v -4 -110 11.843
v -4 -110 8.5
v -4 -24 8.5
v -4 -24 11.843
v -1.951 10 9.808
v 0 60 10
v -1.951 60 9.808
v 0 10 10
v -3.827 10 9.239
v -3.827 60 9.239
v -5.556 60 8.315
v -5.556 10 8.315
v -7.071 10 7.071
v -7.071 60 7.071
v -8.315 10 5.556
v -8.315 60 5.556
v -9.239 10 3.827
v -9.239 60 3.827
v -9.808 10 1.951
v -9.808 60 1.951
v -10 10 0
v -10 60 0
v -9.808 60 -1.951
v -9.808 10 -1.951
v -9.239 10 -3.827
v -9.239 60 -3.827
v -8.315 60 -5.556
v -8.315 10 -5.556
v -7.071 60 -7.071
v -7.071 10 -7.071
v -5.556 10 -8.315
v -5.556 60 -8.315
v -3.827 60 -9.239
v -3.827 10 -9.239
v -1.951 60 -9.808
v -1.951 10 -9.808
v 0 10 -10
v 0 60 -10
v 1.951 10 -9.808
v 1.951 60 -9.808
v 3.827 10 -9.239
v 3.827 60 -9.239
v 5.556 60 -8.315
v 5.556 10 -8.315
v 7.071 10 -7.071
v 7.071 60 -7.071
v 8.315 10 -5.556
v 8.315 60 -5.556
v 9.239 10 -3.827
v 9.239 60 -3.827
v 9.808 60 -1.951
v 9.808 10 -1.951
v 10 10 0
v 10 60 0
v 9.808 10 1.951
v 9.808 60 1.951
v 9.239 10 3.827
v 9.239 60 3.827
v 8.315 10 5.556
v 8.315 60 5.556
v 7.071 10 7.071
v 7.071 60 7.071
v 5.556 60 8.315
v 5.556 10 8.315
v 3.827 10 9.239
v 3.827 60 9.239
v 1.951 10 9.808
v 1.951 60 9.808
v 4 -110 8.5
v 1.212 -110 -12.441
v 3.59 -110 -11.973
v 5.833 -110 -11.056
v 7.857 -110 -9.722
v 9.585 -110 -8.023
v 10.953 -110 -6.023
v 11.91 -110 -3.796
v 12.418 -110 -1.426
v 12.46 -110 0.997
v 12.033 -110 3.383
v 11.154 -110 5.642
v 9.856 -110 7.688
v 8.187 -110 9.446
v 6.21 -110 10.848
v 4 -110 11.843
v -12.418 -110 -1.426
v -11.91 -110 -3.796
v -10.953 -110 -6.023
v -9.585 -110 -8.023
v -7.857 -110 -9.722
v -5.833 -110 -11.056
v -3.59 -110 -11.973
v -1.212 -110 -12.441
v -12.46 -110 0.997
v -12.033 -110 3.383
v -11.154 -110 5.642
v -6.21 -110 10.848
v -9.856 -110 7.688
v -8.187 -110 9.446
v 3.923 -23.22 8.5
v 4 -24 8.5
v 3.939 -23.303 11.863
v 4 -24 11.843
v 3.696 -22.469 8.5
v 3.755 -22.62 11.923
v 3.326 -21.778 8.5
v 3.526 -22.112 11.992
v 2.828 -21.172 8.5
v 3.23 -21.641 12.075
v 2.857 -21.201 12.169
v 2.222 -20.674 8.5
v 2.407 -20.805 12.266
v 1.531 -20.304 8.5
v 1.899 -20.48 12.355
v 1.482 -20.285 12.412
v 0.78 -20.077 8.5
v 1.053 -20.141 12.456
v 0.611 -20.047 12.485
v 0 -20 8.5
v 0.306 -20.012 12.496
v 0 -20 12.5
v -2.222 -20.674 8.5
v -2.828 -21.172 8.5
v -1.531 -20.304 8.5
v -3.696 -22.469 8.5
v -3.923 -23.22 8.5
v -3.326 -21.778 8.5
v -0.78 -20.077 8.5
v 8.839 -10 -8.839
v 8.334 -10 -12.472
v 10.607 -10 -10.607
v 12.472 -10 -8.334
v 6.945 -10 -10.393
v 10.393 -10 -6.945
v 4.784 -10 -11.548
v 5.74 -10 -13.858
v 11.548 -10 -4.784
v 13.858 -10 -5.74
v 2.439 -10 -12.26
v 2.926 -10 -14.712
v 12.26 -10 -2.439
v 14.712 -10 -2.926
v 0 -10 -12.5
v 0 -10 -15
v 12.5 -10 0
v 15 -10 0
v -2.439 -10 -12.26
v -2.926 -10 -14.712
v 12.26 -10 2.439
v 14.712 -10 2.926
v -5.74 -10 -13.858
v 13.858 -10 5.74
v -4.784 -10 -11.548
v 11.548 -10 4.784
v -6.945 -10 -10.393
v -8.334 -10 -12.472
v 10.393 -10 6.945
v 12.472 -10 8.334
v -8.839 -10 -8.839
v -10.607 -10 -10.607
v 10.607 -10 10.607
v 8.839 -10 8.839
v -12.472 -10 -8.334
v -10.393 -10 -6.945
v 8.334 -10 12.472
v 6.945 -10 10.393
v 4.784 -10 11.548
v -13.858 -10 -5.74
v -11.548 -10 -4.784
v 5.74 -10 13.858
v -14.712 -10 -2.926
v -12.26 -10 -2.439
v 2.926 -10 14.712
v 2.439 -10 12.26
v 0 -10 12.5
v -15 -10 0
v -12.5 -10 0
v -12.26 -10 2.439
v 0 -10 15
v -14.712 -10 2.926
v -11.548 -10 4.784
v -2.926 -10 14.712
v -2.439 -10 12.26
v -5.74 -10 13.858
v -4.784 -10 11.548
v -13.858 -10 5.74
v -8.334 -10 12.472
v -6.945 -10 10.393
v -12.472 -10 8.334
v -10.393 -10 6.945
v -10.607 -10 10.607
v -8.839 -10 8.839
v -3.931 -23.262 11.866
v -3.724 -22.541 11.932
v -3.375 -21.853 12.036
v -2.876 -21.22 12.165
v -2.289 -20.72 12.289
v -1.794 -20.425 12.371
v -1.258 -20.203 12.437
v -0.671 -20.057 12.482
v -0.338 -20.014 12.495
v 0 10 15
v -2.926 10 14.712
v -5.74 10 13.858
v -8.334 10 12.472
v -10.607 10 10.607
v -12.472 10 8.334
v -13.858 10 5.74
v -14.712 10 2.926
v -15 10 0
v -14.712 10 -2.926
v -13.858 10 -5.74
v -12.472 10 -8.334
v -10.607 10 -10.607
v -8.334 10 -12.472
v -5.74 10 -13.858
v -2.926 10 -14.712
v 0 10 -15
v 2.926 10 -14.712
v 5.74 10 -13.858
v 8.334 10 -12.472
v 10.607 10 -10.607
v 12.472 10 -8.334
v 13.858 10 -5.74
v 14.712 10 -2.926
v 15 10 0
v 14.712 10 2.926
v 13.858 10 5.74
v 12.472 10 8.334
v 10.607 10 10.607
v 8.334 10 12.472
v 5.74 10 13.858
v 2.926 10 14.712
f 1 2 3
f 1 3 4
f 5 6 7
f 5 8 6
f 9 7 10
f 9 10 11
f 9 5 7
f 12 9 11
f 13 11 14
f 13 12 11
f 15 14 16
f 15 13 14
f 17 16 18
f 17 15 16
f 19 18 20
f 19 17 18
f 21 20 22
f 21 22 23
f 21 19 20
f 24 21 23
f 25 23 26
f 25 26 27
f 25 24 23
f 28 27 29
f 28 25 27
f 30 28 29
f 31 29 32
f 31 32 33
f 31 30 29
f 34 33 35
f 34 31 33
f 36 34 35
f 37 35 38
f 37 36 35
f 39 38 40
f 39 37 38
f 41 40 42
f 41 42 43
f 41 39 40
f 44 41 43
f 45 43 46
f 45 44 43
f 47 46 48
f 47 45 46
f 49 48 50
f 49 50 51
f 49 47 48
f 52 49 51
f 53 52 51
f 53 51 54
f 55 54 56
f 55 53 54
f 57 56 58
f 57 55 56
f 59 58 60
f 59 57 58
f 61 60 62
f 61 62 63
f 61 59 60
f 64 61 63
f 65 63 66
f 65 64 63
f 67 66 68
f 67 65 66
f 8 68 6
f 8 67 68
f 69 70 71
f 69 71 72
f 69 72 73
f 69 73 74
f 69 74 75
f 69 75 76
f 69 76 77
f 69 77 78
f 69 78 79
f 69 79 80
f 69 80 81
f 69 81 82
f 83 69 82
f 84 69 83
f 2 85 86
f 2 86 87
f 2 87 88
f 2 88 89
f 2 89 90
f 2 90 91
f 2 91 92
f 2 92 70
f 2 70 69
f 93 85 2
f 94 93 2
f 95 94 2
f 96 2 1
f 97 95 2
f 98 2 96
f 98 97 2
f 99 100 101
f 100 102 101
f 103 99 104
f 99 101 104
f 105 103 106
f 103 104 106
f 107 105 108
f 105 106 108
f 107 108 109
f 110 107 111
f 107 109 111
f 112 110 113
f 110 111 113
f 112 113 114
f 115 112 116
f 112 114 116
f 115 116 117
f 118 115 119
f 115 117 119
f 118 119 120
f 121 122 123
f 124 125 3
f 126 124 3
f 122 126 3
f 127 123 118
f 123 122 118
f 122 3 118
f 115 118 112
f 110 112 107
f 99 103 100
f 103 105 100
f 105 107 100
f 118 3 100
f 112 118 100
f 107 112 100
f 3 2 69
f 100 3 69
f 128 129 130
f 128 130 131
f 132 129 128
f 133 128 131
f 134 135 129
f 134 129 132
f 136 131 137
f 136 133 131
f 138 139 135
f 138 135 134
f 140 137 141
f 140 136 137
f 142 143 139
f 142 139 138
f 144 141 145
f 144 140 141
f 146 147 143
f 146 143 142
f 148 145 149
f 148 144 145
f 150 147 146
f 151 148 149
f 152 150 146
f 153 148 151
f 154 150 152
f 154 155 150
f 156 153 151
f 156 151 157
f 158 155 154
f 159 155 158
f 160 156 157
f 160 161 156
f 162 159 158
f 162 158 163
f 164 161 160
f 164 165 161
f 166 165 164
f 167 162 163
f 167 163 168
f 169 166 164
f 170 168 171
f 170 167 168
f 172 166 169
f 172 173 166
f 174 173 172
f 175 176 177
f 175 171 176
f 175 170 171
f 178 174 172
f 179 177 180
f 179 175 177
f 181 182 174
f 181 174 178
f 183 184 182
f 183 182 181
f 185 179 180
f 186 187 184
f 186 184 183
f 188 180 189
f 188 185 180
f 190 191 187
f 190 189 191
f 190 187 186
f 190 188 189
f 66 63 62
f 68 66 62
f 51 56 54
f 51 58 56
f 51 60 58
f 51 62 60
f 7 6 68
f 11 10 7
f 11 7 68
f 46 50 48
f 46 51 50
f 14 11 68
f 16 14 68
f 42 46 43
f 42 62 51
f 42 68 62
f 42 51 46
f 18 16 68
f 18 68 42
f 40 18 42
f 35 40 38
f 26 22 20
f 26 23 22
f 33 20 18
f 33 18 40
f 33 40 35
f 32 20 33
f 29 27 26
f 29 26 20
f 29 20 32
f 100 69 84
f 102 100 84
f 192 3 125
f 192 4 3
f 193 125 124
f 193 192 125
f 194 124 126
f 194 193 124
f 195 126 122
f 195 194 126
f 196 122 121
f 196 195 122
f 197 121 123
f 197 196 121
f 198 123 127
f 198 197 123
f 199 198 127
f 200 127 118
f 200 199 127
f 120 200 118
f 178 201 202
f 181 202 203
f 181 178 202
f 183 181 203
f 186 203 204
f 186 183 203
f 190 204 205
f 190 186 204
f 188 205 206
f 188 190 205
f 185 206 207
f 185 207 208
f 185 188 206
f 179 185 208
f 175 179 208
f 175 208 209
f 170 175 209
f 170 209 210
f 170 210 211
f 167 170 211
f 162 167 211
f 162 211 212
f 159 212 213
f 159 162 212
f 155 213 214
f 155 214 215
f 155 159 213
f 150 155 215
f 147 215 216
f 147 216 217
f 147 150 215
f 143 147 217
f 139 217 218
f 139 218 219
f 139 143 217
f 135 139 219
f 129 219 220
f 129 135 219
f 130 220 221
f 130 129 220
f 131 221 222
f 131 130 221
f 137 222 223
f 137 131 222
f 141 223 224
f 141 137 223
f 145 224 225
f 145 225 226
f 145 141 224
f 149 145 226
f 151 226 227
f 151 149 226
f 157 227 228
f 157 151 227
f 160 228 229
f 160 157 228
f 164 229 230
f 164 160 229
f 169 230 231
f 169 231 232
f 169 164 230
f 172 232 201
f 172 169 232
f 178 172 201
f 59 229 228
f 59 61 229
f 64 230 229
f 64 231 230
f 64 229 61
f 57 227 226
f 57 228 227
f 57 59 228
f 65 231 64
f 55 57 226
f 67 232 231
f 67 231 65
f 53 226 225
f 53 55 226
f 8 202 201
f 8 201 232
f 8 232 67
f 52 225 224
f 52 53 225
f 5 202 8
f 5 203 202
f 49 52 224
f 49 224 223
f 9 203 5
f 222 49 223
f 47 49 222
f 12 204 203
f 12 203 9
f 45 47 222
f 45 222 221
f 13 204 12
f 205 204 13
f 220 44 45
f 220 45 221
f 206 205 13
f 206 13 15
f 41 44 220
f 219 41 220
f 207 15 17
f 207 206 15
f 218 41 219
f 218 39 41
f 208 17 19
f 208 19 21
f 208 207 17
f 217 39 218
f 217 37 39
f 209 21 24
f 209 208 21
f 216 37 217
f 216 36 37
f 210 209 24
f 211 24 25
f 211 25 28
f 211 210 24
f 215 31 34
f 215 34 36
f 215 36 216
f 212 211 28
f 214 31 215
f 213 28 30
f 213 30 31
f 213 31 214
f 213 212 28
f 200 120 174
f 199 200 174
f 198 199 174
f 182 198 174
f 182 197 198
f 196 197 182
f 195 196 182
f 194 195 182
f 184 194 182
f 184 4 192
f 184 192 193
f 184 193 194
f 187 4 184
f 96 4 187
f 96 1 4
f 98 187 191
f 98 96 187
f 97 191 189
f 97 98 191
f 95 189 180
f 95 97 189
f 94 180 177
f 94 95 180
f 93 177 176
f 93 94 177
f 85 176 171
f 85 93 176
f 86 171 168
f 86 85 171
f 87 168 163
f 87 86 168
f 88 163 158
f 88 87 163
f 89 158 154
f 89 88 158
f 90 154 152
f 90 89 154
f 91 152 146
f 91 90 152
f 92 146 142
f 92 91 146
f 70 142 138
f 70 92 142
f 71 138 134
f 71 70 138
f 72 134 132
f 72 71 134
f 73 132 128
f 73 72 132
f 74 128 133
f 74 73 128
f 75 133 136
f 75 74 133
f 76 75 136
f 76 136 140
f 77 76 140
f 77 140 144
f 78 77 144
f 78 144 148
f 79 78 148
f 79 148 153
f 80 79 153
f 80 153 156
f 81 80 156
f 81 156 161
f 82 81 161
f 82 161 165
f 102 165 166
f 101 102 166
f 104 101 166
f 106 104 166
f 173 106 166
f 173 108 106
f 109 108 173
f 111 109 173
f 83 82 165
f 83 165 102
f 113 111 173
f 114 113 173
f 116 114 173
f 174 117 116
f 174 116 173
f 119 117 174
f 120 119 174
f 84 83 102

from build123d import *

# Parameters (mm, degrees)
F2_W     = 8
F2_H     = 4
F3_DEPTH = 90
F4_R     = 3.99999


# Not quite as in the source:
# - a fillet or chamfer is up to 0.001 mm smaller than in the source, because OpenCascade refuses the exact size


with BuildPart() as f1:
    # F0 (on Right) → F1 (revolve)
    with BuildSketch(Plane.YZ):
        Polygon((-110, 12.5), (-110, 0), (60, 0), (60, 10), (10, 10), (10, 15), (-10, 15), (-10, 12.5), align=None)
    revolve(axis=Axis((0, -25, 0), (0, -1, 0)))

    # F2 (on face) → F3 (cut)
    with BuildSketch(Plane.XZ.offset(110)):
        with Locations((0, 10.5)):
            Rectangle(F2_W, F2_H)
    extrude(amount=-F3_DEPTH, mode=Mode.SUBTRACT)

    # F4 (radius 4 in the source; OpenCascade refuses exactly that, so slightly less here)
    f4_edges = [f1.edges().sort_by_distance(p)[0] for p in [
        (-4, -20, 10.17136),
        (4, -20, 10.17136),
    ]]
    fillet(f4_edges, radius=F4_R)


solid = f1.part
